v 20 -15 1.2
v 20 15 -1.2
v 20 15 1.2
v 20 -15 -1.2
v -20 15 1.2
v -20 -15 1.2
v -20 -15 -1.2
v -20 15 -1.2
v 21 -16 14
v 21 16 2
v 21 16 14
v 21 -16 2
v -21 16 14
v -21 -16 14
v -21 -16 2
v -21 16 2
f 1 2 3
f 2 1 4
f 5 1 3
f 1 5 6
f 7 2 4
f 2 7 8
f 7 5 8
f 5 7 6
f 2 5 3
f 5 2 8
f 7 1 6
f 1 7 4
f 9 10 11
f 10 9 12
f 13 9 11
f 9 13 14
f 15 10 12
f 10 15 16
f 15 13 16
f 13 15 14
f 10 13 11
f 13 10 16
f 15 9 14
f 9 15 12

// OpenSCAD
// file: shared_dimensions.scad
// Shared OpenSCAD dimensions for this project.
// Keep critical dimensions here instead of burying them in geometry modules.

wall_thickness = 2.4;
corner_radius = 2.0;
clearance = 0.30;
// main file
// OpenSCAD project template.
// Use mode = "production" for STL export.

mode = "preview"; // "preview" or "production"
$fn = mode == "production" ? 64 : 32;

include <shared_dimensions.scad>

module production_geometry() {
    cube([40, 30, wall_thickness], center = true);
}

module preview_helpers() {
    color([0, 0.45, 1, 0.25])
        translate([0, 0, 8])
            cube([42, 32, 12], center = true);
}

module main() {
    production_geometry();

    if (mode == "preview") {
        preview_helpers();
    }
}

main();
